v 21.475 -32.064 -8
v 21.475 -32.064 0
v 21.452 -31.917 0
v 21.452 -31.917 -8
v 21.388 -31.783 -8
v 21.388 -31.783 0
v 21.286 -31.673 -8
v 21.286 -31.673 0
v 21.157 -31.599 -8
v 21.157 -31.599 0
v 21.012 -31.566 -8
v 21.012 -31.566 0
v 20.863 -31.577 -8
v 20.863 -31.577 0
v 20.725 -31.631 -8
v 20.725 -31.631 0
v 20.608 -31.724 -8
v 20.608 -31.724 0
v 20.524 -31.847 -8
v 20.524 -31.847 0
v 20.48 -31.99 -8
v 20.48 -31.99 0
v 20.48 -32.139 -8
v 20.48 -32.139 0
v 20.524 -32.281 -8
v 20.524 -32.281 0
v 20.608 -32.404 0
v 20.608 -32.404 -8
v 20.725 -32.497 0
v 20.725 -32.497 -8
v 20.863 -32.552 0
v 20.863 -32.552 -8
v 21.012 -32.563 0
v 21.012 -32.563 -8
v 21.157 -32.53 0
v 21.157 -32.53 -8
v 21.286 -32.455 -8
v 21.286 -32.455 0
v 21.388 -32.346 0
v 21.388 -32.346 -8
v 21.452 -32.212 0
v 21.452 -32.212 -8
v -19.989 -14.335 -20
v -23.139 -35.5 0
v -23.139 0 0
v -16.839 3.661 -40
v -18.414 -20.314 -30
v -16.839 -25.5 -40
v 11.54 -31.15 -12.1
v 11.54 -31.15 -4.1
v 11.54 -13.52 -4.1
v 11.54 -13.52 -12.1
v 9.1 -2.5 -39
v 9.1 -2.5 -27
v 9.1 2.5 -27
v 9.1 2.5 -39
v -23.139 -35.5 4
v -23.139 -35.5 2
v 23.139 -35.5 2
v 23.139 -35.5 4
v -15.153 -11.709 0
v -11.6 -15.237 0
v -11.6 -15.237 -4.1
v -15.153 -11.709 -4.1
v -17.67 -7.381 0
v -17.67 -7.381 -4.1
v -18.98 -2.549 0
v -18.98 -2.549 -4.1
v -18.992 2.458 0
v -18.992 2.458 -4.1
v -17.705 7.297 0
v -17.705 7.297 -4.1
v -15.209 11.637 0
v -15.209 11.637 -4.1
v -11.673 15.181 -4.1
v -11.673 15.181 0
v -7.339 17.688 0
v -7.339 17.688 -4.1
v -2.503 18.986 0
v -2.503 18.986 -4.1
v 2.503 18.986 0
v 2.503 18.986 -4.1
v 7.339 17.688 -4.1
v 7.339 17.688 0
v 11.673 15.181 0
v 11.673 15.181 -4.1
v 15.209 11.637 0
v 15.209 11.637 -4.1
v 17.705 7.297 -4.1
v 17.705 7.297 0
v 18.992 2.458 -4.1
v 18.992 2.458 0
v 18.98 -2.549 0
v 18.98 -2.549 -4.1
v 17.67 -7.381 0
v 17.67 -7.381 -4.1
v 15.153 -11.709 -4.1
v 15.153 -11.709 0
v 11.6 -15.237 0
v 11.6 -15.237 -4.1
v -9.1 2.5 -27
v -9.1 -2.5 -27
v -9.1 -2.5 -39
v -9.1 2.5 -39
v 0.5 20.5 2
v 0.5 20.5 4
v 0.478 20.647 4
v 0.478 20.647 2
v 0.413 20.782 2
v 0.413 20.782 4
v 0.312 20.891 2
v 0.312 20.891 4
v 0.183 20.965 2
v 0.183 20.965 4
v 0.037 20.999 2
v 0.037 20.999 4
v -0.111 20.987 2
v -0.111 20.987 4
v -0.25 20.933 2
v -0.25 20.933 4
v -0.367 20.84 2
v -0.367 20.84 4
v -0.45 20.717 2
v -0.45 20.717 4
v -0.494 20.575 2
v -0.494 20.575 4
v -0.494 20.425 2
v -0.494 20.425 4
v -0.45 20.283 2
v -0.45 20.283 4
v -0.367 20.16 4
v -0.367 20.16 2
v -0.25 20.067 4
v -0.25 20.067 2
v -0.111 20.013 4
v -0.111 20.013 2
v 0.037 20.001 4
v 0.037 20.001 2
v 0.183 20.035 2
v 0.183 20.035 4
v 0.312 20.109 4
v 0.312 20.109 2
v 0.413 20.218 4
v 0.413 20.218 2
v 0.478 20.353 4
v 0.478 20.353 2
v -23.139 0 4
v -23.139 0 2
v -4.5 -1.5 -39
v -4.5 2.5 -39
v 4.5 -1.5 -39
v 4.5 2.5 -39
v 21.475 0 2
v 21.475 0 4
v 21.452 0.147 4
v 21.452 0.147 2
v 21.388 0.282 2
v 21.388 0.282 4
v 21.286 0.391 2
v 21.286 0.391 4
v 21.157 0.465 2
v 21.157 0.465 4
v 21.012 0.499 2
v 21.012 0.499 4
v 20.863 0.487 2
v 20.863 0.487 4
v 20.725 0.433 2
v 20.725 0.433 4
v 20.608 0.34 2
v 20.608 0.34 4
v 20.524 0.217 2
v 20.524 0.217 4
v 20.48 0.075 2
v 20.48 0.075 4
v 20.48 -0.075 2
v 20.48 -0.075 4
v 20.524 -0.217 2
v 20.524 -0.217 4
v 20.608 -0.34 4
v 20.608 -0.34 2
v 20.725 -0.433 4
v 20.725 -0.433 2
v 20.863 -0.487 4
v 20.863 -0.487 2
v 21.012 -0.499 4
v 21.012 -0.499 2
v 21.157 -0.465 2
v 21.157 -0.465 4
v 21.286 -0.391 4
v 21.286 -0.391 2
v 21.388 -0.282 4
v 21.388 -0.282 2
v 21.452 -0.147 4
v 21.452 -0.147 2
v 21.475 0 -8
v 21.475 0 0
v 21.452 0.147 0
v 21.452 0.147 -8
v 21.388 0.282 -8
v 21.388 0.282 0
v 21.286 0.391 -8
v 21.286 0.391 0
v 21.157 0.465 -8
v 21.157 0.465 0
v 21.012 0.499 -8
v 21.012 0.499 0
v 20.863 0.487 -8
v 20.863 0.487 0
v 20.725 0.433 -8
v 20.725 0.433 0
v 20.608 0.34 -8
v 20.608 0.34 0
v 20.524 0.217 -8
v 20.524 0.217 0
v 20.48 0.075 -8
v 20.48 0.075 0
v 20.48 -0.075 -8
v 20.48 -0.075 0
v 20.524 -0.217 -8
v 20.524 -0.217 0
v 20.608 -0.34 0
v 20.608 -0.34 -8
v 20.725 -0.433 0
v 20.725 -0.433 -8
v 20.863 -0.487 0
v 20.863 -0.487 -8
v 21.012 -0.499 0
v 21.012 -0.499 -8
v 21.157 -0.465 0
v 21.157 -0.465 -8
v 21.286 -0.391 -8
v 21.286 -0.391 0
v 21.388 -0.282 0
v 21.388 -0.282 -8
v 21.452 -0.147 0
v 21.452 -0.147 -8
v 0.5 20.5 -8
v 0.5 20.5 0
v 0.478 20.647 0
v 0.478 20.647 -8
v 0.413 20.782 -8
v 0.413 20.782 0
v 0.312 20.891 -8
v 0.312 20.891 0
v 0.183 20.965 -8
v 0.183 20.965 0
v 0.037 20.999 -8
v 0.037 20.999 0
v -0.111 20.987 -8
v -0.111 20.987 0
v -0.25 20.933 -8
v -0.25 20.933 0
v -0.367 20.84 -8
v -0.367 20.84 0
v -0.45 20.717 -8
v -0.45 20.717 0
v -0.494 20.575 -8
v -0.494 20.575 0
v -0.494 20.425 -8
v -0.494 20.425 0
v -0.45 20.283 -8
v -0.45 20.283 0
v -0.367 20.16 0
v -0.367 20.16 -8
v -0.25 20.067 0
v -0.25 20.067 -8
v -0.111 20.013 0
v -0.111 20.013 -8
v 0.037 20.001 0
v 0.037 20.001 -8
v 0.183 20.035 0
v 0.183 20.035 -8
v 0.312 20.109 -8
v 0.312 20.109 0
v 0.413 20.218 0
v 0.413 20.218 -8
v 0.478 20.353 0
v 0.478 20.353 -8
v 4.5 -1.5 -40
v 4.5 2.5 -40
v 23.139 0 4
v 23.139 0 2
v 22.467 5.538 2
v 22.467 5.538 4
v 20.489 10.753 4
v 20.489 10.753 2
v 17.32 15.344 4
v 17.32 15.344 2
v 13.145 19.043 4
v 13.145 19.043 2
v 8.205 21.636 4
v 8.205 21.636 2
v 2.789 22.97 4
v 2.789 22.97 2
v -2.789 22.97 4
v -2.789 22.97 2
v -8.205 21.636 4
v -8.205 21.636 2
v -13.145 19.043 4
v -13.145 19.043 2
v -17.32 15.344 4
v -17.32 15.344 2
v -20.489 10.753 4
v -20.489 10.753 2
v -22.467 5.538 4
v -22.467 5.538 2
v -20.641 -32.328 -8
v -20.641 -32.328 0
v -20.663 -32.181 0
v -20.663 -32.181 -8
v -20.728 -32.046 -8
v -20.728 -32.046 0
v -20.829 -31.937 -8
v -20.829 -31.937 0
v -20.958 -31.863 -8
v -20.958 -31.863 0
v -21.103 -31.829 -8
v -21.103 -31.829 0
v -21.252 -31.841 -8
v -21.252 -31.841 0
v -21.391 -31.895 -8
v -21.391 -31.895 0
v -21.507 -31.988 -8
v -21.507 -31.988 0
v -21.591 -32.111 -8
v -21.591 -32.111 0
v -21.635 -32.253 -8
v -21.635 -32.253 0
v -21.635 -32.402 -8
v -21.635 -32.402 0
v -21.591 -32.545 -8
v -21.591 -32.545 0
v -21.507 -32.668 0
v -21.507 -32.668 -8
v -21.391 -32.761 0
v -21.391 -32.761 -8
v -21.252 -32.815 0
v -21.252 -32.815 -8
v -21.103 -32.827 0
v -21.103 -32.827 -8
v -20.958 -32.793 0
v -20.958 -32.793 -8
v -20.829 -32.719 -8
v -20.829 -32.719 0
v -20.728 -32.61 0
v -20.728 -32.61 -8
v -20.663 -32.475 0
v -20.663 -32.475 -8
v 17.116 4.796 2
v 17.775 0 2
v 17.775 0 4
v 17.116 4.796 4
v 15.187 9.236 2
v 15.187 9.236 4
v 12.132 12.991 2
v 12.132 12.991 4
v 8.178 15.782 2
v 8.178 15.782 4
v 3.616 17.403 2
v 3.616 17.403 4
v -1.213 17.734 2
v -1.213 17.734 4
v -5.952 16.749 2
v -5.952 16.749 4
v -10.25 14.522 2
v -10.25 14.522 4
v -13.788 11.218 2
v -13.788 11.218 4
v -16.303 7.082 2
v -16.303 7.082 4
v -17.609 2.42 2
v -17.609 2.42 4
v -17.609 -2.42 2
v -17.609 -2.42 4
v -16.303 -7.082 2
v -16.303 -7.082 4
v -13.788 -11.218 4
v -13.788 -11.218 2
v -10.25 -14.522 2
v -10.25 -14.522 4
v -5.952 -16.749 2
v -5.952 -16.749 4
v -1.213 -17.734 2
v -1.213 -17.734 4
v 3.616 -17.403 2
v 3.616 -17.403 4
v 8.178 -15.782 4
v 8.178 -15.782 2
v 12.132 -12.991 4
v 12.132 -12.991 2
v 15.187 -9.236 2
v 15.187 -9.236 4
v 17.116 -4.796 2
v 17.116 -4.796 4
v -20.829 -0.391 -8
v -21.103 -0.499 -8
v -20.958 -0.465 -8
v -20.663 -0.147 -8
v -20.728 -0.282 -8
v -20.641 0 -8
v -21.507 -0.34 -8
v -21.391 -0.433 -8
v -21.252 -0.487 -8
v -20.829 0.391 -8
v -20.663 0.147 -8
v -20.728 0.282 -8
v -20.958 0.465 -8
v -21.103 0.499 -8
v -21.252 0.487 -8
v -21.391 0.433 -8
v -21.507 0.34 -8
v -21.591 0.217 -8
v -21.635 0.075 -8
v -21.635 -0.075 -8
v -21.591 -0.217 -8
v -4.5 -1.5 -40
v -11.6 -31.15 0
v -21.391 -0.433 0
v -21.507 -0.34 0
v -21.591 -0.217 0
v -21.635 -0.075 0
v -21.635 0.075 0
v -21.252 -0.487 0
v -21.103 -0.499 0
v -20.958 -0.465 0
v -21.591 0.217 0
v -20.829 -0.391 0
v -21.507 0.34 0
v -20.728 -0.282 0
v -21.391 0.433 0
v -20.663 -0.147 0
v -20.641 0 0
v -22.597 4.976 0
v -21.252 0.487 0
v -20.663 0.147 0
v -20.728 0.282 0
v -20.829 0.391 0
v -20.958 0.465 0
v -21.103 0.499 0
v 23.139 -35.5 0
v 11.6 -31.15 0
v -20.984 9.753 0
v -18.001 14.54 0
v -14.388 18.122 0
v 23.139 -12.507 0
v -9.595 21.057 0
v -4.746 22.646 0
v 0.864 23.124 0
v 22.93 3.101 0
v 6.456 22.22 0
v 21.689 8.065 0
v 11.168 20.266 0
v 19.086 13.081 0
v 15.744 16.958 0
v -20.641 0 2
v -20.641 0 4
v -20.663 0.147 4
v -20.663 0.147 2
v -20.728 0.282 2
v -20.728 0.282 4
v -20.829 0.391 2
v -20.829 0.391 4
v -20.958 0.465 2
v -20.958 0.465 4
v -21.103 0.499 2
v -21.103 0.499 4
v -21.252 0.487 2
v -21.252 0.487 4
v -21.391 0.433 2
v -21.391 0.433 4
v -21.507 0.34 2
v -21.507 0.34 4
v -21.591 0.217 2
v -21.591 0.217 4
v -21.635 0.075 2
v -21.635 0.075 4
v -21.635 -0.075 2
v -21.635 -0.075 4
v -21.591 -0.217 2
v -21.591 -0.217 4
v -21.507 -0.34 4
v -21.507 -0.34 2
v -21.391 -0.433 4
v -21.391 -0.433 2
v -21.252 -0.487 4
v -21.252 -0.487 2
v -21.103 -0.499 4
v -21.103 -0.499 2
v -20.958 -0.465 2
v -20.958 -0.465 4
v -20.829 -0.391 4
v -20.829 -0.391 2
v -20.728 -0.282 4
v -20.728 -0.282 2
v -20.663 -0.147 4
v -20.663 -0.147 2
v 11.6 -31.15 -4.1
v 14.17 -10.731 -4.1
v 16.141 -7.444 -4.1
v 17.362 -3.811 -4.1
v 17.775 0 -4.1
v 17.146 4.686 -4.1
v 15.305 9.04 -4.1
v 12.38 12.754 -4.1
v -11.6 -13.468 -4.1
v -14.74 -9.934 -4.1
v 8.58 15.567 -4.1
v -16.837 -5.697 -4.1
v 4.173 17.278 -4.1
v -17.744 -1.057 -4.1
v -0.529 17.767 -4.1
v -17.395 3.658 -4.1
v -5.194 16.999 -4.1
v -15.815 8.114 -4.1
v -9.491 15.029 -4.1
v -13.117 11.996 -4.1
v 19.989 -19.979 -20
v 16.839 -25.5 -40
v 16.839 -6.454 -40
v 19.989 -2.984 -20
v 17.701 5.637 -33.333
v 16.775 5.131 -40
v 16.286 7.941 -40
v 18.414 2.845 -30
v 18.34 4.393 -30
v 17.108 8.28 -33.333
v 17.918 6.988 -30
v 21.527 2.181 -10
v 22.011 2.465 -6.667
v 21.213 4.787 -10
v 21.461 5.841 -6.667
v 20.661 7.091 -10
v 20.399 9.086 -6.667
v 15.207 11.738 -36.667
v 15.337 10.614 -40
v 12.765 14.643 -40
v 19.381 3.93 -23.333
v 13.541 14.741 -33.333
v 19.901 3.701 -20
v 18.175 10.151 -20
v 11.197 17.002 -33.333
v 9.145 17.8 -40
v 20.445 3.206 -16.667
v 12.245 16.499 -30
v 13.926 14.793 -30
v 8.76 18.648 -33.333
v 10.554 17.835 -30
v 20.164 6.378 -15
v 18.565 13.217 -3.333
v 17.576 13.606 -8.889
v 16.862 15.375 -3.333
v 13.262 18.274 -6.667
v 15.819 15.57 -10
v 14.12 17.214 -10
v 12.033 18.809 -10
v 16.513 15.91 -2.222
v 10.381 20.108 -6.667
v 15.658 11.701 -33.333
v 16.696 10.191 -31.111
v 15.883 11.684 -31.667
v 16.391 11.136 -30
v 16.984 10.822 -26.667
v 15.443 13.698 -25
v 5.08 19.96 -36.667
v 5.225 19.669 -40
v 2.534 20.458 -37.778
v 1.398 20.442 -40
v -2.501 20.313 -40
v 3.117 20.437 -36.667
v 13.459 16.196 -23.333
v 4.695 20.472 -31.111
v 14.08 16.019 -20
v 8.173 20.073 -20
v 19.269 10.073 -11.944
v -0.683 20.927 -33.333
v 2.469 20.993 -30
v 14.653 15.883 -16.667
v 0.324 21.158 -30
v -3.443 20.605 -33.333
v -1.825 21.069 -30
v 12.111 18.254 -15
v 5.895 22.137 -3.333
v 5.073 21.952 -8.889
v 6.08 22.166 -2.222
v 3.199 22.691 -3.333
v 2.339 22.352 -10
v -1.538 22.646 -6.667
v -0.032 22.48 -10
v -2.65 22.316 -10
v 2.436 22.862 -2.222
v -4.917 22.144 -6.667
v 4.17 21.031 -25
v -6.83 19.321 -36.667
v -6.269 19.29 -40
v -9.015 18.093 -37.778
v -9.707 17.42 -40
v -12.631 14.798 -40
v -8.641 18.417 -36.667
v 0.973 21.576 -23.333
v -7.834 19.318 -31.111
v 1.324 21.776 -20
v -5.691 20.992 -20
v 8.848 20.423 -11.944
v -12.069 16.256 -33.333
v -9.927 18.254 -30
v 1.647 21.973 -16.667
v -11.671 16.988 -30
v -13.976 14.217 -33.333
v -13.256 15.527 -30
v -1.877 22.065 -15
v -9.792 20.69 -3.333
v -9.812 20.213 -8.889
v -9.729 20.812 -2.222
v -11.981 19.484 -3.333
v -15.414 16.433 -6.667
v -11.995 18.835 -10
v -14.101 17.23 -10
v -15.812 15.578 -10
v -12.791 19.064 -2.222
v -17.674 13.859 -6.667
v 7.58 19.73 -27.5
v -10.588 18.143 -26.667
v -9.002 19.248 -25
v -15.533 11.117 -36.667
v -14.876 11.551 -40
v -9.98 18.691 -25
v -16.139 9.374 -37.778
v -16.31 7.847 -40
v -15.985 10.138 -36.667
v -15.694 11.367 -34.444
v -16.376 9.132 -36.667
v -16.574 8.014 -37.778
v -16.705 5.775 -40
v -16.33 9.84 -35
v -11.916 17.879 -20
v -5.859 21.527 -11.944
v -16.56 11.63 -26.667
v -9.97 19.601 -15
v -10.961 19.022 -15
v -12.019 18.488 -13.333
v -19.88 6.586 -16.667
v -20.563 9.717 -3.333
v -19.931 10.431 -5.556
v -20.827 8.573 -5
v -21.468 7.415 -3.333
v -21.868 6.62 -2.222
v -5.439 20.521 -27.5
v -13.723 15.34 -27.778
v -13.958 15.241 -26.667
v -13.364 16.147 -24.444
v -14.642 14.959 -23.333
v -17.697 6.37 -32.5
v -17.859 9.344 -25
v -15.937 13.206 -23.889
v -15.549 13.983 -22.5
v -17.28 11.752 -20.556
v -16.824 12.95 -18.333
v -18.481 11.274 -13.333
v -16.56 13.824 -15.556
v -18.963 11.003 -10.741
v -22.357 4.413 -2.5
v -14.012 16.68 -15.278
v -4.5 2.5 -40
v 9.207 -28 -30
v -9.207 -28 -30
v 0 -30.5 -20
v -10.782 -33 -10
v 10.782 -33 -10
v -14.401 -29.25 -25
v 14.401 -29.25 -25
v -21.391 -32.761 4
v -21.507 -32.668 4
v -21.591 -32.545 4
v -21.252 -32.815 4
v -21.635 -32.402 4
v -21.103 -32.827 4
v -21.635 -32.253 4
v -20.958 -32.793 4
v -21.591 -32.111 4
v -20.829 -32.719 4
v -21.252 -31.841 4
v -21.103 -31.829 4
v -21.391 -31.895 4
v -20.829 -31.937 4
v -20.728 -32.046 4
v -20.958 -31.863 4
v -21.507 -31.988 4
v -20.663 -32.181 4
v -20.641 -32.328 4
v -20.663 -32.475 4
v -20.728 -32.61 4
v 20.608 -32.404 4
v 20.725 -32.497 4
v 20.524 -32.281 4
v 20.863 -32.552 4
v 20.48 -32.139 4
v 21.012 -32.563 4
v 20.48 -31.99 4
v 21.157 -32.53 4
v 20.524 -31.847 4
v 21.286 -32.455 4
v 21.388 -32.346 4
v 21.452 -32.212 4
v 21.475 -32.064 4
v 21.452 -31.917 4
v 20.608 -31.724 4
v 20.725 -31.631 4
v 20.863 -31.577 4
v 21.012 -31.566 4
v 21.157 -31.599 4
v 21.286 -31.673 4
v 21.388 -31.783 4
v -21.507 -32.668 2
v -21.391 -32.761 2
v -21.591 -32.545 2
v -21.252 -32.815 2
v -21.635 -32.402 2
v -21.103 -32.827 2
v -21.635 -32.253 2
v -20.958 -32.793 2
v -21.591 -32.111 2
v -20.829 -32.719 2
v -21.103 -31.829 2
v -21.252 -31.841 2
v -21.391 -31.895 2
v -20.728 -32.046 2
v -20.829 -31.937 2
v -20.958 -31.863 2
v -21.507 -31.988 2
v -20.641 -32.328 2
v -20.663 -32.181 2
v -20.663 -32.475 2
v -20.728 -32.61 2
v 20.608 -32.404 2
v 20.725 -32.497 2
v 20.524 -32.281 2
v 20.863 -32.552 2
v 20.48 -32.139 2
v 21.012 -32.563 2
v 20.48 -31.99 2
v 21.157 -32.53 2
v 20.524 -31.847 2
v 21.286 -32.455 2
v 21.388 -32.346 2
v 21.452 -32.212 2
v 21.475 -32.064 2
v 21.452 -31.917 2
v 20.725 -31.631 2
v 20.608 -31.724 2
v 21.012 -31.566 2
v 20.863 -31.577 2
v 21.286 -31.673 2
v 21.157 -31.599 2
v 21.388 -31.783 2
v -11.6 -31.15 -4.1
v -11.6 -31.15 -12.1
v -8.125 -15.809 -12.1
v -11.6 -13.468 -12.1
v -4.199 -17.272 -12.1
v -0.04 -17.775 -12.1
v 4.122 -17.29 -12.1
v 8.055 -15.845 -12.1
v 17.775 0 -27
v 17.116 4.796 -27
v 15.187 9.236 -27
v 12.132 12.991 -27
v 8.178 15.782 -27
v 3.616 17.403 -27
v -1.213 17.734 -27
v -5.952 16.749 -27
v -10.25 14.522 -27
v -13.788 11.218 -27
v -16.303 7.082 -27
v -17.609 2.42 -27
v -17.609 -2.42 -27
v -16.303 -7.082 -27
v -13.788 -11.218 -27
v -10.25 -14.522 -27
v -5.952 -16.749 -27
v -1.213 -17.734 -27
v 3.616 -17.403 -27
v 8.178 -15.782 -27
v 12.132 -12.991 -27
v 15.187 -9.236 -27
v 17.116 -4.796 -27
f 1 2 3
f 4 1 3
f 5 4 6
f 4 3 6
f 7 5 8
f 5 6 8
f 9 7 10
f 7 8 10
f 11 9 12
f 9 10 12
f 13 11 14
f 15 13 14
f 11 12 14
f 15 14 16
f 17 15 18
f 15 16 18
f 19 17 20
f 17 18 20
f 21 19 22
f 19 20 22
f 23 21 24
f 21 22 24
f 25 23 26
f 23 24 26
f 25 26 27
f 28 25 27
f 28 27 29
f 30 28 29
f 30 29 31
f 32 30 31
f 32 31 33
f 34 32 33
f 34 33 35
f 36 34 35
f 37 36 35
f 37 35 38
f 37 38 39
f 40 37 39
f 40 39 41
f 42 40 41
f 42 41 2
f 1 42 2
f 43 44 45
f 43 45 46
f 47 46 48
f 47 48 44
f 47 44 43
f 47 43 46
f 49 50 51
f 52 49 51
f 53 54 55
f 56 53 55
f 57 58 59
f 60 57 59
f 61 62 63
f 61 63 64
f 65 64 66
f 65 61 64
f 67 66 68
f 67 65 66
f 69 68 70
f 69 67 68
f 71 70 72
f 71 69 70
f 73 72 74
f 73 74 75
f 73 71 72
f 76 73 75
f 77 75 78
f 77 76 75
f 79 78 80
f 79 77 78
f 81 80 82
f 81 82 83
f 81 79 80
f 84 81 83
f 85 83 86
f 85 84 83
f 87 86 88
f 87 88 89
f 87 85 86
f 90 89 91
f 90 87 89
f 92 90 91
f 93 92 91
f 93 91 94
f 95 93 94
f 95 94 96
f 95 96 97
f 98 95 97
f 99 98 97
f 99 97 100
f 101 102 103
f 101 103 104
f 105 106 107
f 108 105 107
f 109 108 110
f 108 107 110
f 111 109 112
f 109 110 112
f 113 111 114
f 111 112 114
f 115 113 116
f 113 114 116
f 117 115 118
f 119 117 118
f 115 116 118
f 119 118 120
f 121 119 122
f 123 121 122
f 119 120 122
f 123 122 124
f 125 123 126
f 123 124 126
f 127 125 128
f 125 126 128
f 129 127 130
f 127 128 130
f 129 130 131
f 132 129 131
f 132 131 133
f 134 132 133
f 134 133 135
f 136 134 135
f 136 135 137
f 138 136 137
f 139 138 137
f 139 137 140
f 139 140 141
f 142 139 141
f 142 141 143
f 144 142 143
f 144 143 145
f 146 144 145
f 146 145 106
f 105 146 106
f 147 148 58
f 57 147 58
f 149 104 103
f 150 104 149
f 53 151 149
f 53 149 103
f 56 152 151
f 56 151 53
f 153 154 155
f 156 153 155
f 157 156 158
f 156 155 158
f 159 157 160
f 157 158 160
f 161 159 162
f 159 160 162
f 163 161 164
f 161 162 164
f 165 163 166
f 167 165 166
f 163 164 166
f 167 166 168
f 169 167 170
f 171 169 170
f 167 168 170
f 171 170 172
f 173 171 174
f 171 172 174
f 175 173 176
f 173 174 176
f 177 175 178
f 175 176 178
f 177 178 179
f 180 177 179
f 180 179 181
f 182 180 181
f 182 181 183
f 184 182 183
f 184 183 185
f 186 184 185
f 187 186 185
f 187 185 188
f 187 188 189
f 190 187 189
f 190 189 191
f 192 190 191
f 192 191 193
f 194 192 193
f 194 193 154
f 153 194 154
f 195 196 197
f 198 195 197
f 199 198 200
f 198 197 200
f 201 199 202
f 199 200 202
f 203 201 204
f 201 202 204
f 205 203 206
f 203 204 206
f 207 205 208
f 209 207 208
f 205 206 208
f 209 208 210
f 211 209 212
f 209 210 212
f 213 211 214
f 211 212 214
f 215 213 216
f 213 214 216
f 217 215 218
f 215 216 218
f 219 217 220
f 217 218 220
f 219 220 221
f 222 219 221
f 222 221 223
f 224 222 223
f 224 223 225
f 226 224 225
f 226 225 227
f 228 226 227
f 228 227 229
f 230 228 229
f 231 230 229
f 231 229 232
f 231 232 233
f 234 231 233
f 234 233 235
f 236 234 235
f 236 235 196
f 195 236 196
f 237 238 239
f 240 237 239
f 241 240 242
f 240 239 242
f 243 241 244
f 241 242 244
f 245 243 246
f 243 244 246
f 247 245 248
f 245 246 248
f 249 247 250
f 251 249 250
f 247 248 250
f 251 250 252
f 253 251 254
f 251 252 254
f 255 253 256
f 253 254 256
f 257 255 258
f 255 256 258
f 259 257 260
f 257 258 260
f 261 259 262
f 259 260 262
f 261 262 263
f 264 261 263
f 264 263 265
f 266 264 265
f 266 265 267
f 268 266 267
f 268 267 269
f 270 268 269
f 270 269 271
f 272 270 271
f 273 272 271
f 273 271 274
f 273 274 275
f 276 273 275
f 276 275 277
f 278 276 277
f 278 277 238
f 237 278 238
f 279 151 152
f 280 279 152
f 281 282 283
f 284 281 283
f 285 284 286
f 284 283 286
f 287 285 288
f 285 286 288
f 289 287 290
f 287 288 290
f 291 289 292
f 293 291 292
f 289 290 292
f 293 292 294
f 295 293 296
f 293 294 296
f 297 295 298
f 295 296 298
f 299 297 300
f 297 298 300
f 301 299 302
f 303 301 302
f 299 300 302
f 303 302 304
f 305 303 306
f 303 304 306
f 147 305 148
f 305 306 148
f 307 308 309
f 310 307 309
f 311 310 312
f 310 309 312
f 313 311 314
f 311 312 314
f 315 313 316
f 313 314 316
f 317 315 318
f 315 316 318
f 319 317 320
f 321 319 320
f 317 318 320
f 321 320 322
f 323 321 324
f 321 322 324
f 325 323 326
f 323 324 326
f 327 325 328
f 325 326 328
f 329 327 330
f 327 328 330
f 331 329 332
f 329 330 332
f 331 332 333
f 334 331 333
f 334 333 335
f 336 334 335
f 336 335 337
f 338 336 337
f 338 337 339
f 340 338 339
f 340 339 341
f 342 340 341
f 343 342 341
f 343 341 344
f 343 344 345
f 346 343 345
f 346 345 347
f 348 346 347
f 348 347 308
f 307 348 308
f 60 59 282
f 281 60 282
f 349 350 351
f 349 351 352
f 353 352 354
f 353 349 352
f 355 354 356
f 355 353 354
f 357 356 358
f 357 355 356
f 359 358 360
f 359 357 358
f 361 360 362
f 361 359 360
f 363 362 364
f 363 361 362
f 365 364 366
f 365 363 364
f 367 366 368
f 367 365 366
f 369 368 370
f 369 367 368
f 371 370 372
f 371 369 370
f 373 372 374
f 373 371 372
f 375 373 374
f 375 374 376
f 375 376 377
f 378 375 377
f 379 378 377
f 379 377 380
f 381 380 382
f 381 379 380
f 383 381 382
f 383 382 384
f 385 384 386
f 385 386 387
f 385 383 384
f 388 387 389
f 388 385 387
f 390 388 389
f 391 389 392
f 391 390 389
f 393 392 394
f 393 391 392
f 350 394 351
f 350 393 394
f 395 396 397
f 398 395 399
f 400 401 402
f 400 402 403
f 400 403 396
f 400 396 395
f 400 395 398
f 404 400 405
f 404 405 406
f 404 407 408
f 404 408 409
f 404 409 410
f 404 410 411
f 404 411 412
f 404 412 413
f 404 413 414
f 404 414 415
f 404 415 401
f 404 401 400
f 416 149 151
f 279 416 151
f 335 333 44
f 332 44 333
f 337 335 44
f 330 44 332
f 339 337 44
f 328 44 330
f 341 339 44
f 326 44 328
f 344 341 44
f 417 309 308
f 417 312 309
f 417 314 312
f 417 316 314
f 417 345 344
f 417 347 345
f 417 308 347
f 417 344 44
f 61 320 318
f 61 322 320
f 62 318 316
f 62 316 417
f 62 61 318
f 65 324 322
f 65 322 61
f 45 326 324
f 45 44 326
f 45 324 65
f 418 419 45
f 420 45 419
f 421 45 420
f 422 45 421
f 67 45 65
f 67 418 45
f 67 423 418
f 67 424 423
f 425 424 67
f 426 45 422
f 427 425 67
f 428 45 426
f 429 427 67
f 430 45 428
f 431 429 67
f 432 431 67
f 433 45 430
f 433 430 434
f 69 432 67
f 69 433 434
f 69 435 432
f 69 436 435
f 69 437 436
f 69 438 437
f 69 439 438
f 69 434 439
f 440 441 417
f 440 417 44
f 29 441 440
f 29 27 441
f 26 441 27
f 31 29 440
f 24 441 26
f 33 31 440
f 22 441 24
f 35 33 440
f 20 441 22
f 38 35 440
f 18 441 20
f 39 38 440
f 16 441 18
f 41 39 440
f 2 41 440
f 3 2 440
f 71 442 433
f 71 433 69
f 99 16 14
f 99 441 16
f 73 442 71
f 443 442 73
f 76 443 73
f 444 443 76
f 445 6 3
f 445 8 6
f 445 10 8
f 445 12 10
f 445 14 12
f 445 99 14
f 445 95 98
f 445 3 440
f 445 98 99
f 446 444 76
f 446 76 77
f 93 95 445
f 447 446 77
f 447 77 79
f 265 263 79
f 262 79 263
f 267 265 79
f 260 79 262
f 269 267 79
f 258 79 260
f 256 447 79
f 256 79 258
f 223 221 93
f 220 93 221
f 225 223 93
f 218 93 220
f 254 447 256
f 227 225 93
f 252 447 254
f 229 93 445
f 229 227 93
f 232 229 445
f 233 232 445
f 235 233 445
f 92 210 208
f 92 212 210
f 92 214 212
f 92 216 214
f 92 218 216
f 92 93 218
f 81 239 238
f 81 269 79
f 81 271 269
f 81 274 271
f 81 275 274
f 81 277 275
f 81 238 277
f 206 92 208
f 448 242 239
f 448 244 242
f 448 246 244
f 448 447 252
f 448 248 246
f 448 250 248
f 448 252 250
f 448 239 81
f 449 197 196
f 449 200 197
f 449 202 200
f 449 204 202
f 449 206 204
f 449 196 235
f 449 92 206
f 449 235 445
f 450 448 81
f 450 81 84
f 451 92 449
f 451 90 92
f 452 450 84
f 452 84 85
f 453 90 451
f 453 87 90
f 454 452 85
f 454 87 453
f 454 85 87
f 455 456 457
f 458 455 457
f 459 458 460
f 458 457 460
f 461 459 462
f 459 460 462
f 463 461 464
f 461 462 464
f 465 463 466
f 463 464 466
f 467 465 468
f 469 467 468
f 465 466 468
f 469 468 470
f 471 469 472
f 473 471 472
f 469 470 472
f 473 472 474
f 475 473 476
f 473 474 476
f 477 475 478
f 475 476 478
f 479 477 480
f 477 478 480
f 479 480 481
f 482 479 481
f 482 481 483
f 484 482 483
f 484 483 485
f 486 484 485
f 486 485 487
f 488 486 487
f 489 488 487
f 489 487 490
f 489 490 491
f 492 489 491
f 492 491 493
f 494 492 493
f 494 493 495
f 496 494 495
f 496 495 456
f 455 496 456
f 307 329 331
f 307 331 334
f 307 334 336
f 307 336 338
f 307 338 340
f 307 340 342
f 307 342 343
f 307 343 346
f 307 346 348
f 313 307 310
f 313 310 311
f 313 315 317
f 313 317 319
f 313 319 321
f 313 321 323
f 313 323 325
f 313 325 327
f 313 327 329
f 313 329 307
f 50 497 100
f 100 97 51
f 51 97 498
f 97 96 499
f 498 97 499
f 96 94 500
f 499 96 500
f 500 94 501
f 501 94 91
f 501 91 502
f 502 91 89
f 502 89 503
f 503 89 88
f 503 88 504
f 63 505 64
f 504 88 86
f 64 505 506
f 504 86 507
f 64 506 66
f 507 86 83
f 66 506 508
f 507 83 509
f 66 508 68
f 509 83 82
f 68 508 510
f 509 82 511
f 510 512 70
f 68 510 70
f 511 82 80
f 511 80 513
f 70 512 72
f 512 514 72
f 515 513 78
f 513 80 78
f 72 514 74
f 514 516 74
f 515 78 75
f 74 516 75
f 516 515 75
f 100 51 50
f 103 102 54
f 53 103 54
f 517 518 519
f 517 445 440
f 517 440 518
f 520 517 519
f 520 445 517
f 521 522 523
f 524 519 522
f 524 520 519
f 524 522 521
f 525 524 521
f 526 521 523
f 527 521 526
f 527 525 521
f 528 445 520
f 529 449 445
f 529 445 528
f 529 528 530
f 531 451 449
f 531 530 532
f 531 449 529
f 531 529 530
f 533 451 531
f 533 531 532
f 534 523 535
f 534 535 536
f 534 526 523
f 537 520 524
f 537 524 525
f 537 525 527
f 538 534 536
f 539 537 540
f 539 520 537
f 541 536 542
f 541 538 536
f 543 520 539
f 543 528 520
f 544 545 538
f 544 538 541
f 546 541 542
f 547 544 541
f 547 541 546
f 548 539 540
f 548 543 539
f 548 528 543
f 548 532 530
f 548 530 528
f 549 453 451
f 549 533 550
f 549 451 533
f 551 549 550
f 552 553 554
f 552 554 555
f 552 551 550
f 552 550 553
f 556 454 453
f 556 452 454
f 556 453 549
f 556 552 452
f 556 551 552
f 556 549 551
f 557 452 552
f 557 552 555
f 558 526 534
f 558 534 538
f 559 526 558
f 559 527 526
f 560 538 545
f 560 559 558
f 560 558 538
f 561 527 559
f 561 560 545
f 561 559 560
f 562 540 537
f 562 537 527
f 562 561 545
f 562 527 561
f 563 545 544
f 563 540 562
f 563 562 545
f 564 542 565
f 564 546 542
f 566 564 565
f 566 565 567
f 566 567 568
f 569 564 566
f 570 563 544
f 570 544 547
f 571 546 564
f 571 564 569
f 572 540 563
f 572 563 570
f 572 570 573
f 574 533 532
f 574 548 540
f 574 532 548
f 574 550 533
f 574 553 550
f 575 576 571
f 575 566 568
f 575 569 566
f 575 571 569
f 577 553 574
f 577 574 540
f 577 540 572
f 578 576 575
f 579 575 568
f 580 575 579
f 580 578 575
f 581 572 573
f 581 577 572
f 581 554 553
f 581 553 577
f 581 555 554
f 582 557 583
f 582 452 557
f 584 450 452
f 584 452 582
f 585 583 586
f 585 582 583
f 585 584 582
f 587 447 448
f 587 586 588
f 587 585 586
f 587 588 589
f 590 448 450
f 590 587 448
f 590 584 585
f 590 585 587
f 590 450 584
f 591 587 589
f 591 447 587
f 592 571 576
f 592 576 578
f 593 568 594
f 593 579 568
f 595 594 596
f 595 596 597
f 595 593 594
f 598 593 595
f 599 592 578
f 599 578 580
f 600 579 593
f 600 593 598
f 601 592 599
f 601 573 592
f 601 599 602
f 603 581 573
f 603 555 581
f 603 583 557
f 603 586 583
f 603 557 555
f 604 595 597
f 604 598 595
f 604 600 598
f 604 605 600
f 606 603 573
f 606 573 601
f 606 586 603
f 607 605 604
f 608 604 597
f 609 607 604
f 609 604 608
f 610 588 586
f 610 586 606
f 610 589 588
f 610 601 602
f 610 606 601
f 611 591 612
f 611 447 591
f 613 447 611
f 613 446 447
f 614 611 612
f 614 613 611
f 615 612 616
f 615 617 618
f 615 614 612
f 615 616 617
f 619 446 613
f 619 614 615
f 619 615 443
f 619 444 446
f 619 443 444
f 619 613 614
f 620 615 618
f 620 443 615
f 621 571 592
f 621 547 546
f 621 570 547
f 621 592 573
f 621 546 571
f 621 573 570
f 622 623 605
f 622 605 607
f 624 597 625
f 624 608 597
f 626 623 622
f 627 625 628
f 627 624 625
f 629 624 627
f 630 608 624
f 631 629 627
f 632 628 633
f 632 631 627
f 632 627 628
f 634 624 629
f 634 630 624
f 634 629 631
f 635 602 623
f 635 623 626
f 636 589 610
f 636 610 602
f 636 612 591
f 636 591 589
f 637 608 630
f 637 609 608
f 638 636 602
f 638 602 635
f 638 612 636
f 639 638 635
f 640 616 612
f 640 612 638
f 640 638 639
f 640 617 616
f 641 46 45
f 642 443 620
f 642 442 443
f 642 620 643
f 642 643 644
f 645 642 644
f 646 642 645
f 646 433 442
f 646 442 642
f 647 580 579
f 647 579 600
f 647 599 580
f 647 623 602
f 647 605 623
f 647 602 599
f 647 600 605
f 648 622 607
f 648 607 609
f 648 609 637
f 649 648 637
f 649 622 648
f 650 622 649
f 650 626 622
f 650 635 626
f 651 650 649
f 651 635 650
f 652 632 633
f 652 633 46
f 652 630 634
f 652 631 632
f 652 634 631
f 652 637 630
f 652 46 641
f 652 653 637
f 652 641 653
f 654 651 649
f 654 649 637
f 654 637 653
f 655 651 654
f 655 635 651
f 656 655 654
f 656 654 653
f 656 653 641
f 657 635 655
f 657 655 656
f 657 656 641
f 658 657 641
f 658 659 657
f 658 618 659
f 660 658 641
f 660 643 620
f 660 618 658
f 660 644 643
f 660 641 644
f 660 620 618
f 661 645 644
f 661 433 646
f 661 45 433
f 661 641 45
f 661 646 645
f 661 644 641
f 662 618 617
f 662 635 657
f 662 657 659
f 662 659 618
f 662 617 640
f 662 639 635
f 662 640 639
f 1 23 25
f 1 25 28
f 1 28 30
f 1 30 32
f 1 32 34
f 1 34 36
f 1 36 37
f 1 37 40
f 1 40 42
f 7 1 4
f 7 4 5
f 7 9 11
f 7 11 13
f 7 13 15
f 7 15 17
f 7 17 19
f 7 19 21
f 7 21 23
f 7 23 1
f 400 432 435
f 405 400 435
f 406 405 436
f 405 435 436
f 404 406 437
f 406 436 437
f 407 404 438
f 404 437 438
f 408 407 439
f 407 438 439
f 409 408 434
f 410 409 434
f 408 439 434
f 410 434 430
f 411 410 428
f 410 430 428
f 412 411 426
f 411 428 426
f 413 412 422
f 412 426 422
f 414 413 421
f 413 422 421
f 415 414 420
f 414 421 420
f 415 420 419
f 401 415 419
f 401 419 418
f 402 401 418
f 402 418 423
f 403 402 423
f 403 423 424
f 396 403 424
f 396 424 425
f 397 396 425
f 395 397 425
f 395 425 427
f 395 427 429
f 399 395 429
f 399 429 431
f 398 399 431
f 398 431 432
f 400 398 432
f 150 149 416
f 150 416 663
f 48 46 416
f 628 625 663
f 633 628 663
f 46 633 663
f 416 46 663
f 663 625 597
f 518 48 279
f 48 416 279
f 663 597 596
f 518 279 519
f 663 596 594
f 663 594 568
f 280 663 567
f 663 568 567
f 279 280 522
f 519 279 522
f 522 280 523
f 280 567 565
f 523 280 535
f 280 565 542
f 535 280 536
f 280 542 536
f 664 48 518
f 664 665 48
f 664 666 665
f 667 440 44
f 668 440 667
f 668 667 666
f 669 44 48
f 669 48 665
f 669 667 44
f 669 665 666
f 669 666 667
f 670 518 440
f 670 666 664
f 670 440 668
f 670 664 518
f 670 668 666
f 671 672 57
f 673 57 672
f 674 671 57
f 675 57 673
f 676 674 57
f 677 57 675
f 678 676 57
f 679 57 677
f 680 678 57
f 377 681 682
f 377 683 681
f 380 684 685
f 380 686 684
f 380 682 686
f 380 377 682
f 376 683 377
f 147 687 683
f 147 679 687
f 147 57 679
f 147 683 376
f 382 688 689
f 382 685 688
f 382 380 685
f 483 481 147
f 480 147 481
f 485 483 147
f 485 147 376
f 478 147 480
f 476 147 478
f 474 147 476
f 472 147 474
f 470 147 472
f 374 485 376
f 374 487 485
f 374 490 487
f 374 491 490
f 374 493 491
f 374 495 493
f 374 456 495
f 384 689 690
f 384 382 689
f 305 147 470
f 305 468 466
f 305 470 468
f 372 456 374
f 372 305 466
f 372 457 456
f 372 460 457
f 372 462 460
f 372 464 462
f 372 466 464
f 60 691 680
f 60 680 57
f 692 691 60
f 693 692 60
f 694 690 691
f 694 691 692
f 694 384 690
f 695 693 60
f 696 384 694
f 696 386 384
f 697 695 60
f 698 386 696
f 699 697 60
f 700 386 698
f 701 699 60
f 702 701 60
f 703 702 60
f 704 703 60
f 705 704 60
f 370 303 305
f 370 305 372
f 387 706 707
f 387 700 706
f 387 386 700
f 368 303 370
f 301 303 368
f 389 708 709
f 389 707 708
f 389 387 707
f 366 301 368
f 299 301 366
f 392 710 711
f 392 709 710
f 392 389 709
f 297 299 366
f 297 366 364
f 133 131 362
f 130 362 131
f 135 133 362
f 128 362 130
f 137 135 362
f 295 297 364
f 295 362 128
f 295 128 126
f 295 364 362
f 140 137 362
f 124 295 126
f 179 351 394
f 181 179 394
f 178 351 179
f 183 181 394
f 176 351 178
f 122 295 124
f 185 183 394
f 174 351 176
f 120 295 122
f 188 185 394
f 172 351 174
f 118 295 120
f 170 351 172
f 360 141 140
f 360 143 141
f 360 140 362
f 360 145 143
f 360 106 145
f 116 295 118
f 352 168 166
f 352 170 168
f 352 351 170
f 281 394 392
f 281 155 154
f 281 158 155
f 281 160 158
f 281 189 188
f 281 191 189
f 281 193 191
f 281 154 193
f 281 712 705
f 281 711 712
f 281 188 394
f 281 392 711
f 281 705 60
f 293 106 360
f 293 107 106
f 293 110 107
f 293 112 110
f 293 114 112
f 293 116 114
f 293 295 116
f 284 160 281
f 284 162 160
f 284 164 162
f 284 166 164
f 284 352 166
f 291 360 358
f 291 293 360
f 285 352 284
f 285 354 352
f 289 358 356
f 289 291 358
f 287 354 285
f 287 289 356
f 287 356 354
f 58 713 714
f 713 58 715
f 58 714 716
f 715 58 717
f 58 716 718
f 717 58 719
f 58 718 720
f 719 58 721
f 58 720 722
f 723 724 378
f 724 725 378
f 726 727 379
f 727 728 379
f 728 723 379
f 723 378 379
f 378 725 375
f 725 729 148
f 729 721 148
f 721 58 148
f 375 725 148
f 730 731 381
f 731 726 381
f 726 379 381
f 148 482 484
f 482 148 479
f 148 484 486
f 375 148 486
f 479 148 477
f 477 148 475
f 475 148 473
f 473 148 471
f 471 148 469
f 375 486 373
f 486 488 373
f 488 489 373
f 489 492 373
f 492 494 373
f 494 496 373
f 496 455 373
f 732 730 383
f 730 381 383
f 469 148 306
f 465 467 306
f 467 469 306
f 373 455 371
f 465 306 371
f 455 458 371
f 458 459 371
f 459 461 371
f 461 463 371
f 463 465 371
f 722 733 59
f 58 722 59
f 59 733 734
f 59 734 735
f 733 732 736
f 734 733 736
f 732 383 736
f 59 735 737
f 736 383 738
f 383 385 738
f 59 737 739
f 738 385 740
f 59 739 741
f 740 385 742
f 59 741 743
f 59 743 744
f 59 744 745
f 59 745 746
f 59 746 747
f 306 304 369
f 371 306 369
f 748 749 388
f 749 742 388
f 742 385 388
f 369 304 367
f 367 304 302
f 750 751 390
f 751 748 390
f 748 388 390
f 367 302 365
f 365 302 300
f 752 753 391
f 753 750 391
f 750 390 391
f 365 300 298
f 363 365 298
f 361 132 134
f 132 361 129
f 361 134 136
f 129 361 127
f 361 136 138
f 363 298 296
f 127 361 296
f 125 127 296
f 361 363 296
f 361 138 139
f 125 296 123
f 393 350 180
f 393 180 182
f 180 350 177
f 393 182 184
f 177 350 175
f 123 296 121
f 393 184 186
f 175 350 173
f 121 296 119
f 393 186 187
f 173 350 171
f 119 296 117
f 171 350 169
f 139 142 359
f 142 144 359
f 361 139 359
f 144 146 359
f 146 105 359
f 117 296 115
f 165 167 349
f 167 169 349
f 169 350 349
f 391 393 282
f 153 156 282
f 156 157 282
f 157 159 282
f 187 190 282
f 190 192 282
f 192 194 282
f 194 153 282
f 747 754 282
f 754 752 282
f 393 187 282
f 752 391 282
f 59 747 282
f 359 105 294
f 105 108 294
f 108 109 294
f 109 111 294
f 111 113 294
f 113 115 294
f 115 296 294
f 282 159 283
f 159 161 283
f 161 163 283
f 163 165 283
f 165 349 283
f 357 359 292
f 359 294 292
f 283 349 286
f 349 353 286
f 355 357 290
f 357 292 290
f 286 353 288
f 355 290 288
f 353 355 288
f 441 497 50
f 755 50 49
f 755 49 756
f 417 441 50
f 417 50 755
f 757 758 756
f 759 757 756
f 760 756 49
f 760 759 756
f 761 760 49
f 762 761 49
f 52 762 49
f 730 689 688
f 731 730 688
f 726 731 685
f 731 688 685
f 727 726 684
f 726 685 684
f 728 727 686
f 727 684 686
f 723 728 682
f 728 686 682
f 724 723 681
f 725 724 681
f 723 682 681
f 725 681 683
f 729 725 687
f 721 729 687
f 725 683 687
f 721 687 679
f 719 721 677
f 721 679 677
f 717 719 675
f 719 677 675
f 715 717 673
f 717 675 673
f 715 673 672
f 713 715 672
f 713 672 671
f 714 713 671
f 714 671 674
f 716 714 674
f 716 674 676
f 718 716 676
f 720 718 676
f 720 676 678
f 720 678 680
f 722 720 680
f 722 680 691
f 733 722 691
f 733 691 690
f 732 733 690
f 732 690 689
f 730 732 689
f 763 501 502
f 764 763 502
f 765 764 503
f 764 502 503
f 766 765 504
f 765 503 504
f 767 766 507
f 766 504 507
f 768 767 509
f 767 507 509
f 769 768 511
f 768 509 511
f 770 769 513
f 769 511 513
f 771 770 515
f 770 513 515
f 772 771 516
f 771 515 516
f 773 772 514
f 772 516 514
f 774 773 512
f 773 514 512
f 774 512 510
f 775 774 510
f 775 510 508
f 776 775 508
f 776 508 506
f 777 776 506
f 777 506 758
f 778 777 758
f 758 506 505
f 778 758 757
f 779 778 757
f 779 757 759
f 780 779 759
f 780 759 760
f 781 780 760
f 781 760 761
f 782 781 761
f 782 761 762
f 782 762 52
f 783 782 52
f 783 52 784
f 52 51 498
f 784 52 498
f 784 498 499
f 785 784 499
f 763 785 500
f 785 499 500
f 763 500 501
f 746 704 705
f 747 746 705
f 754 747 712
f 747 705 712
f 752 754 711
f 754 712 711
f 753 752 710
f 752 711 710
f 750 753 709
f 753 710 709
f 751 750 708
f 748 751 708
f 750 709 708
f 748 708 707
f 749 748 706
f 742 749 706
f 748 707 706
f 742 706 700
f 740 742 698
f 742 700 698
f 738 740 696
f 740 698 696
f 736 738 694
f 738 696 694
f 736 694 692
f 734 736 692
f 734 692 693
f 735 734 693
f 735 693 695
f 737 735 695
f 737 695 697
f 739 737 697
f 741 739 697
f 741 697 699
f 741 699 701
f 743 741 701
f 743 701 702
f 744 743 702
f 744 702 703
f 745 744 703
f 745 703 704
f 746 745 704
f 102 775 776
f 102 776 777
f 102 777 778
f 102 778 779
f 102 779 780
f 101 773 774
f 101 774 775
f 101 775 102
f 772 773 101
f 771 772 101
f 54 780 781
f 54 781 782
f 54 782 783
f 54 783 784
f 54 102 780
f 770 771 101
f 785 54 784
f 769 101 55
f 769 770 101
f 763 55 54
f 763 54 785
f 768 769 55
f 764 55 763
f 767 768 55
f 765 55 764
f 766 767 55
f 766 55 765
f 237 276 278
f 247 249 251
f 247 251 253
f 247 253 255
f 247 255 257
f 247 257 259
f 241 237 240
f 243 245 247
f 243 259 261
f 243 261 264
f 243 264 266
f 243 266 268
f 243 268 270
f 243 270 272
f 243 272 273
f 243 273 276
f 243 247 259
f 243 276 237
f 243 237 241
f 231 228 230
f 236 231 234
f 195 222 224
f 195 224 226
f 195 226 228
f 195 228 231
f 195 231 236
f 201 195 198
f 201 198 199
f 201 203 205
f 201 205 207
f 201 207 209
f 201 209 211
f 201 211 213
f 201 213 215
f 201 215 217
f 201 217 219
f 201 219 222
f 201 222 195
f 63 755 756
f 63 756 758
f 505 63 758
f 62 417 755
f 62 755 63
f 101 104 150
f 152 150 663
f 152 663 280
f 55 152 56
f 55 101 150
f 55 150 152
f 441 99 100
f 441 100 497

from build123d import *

# Parameters (mm, degrees)
ESBO_O3_R                = 17.775
CORTE_EXTRUS_O2_DEPTH    = 27
ESBO_O5_W                = 18.2
ESBO_O5_H                = 5
CORTE_EXTRUS_O3_DEPTH    = 12
ESBO_O6_W                = 9
ESBO_O6_H                = 4
CORTE_EXTRUS_O4_DEPTH    = 12
CORTE_EXTRUS_O5_DEPTH    = 4.1
ESBO_O9_W                = 23.13978744
ESBO_O9_H                = 20.617894971
CORTE_EXTRUS_O6_DEPTH    = 8
ESBO_O10_R               = 17.775
RESSALTO_EXTRUS_O1_DEPTH = 2
ESBO_O11_R               = 0.5
CORTE_EXTRUS_O7_DEPTH    = 12


with BuildPart() as part:
    # Loft1: read off the stored shape, not the designer's step
    # Loft1: loft between two sections, ruled curve by curve
    loft1_from = [
        Edge.make_bspline([(16.839285714, -25.5, -40), (16.839285714, -23.163313322, -40), (16.839285714, -18.358176955, -40), (16.839285714, -10.919642857, -40), (16.839285714, -3.481108759, -40), (16.839285714, 1.324027608, -40), (16.839285714, 4.786186161, -40), (16.611276147, 7.027198338, -40), (15.295049421, 11.304306095, -40), (12.13405931, 15.956740347, -40), (6.544528745, 19.642888976, -40), (0, 20.929296705, -40), (-6.544528745, 19.642888976, -40), (-12.13405931, 15.956740347, -40), (-15.295049421, 11.304306095, -40), (-16.611276147, 7.027198338, -40), (-16.839285714, 4.786186161, -40), (-16.839285714, 3.660714286, -40)], [0, 0, 0, 0, 0.085423021, 0.170846042, 0.256269063, 0.341692084, 0.341692084, 0.382836329, 0.423980574, 0.506269063, 0.588557553, 0.670846042, 0.753134532, 0.835423021, 0.917711511, 0.958855755, 1, 1, 1, 1], 3),
        Edge.make_line((-16.839285714, 3.660714286, -40), (-16.839285714, -25.5, -40)),
        Edge.make_line((-16.839285714, -25.5, -40), (16.839285714, -25.5, -40)),
    ]
    loft1_to = [
        Edge.make_bspline([(23.139172611, -35.5, 0), (23.139172611, -32.419251356, 0), (23.139172611, -26.452157178, 0), (23.139172611, -17.75, 0), (23.139172611, -9.047842822, 0), (23.139172611, -3.080748644, 0), (23.139172611, 1.483851466, 0), (22.851558574, 4.462401025, 0), (21.134983596, 10.237959163, 0), (16.9026912, 16.679187276, 0), (9.180031183, 21.908054295, 0), (0, 23.75609401, 0), (-9.180031183, 21.908054295, 0), (-16.9026912, 16.679187276, 0), (-21.134983596, 10.237959163, 0), (-22.851558574, 4.462401025, 0), (-23.139172611, 1.483851466, 0), (-23.139172611, 0, 0)], [0, 0, 0, 0, 0.085423021, 0.170846042, 0.256269063, 0.341692084, 0.341692084, 0.382836329, 0.423980574, 0.506269063, 0.588557553, 0.670846042, 0.753134532, 0.835423021, 0.917711511, 0.958855755, 1, 1, 1, 1], 3),
        Edge.make_line((-23.139172611, 0, 0), (-23.139172611, -35.5, 0)),
        Edge.make_line((-23.139172611, -35.5, 0), (23.139172611, -35.5, 0)),
    ]
    loft1 = Solid(Shell([*[Face.make_surface_from_curves(loft1_from[k], loft1_to[k]) for k in range(3)], Face(Wire(loft1_from)), Face(Wire(loft1_to))]))
    add(loft1)

    # Esboço3 → Corte-extrusão2 (cut)
    with BuildSketch(Plane.XY):
        Circle(ESBO_O3_R)
    extrude(amount=-CORTE_EXTRUS_O2_DEPTH, mode=Mode.SUBTRACT)

    # Esboço5 → Corte-extrusão3 (cut)
    with BuildSketch(Plane.XY.offset(-27)):
        Rectangle(ESBO_O5_W, ESBO_O5_H)
    extrude(amount=-CORTE_EXTRUS_O3_DEPTH, mode=Mode.SUBTRACT)

    # Esboço6 → Corte-extrusão4 (cut)
    with BuildSketch(Plane.XY.offset(-39)):
        with Locations((0, 0.5)):
            Rectangle(ESBO_O6_W, ESBO_O6_H)
    extrude(amount=-CORTE_EXTRUS_O4_DEPTH, mode=Mode.SUBTRACT)

    # Esboço8 → Corte-extrusão5 (cut)
    with BuildSketch(Plane.XY):
        with BuildLine():
            Line((11.6, -15.236879602), (11.6, -31.15))
            Line((11.6, -31.15), (-11.6, -31.15))
            Line((-11.6, -31.15), (-11.6, -15.236879602))
            ThreePointArc((-11.6, -15.236879602), (0, 19.15), (11.6, -15.236879602))
        make_face()
    extrude(amount=-CORTE_EXTRUS_O5_DEPTH, mode=Mode.SUBTRACT)

    # Esboço9 → Corte-extrusão6 (cut)
    with BuildSketch(Plane.XY.offset(-4.1)):
        with Locations((-0.03010628, -20.841052514)):
            Rectangle(ESBO_O9_W, ESBO_O9_H)
    extrude(amount=-CORTE_EXTRUS_O6_DEPTH, mode=Mode.SUBTRACT)


with BuildPart() as body_2:
    # Esboço10 → Ressalto-extrusão1 (new body)
    with BuildSketch(Plane.XY.offset(2)):
        with BuildLine():
            Line((23.139172611, -35.5), (23.139172611, 0))
            ThreePointArc((23.139172611, 0), (0, 23.139172611), (-23.139172611, 0))
            Line((-23.139172611, 0), (-23.139172611, -35.5))
            Line((-23.139172611, -35.5), (23.139172611, -35.5))
        make_face()
        Circle(ESBO_O10_R, mode=Mode.SUBTRACT)
    extrude(amount=RESSALTO_EXTRUS_O1_DEPTH)


with BuildPart() as corte_extrus_o7_tool:
    # Esboço11 → Corte-extrusão7 (new body)
    with BuildSketch(Plane.XY.offset(4)):
        with Locations((0, 20.5)):
            Circle(ESBO_O11_R)
        with Locations((-21.140831683, 0)):
            Circle(ESBO_O11_R)
        with Locations((20.974695481, 0)):
            Circle(ESBO_O11_R)
        with Locations((-21.140831683, -32.327973325)):
            Circle(ESBO_O11_R)
        with Locations((20.974695481, -32.064260334)):
            Circle(ESBO_O11_R)
    extrude(amount=-CORTE_EXTRUS_O7_DEPTH)


with BuildPart() as part_1:
    add(part.part)

    # Corte-extrusão7: cut by corte_extrus_o7_tool
    add(corte_extrus_o7_tool.part, mode=Mode.SUBTRACT)


with BuildPart() as body_2_1:
    add(body_2.part)

    # Corte-extrusão7: cut by corte_extrus_o7_tool
    add(corte_extrus_o7_tool.part, mode=Mode.SUBTRACT)


solid = Compound([part_1.part, body_2_1.part])
